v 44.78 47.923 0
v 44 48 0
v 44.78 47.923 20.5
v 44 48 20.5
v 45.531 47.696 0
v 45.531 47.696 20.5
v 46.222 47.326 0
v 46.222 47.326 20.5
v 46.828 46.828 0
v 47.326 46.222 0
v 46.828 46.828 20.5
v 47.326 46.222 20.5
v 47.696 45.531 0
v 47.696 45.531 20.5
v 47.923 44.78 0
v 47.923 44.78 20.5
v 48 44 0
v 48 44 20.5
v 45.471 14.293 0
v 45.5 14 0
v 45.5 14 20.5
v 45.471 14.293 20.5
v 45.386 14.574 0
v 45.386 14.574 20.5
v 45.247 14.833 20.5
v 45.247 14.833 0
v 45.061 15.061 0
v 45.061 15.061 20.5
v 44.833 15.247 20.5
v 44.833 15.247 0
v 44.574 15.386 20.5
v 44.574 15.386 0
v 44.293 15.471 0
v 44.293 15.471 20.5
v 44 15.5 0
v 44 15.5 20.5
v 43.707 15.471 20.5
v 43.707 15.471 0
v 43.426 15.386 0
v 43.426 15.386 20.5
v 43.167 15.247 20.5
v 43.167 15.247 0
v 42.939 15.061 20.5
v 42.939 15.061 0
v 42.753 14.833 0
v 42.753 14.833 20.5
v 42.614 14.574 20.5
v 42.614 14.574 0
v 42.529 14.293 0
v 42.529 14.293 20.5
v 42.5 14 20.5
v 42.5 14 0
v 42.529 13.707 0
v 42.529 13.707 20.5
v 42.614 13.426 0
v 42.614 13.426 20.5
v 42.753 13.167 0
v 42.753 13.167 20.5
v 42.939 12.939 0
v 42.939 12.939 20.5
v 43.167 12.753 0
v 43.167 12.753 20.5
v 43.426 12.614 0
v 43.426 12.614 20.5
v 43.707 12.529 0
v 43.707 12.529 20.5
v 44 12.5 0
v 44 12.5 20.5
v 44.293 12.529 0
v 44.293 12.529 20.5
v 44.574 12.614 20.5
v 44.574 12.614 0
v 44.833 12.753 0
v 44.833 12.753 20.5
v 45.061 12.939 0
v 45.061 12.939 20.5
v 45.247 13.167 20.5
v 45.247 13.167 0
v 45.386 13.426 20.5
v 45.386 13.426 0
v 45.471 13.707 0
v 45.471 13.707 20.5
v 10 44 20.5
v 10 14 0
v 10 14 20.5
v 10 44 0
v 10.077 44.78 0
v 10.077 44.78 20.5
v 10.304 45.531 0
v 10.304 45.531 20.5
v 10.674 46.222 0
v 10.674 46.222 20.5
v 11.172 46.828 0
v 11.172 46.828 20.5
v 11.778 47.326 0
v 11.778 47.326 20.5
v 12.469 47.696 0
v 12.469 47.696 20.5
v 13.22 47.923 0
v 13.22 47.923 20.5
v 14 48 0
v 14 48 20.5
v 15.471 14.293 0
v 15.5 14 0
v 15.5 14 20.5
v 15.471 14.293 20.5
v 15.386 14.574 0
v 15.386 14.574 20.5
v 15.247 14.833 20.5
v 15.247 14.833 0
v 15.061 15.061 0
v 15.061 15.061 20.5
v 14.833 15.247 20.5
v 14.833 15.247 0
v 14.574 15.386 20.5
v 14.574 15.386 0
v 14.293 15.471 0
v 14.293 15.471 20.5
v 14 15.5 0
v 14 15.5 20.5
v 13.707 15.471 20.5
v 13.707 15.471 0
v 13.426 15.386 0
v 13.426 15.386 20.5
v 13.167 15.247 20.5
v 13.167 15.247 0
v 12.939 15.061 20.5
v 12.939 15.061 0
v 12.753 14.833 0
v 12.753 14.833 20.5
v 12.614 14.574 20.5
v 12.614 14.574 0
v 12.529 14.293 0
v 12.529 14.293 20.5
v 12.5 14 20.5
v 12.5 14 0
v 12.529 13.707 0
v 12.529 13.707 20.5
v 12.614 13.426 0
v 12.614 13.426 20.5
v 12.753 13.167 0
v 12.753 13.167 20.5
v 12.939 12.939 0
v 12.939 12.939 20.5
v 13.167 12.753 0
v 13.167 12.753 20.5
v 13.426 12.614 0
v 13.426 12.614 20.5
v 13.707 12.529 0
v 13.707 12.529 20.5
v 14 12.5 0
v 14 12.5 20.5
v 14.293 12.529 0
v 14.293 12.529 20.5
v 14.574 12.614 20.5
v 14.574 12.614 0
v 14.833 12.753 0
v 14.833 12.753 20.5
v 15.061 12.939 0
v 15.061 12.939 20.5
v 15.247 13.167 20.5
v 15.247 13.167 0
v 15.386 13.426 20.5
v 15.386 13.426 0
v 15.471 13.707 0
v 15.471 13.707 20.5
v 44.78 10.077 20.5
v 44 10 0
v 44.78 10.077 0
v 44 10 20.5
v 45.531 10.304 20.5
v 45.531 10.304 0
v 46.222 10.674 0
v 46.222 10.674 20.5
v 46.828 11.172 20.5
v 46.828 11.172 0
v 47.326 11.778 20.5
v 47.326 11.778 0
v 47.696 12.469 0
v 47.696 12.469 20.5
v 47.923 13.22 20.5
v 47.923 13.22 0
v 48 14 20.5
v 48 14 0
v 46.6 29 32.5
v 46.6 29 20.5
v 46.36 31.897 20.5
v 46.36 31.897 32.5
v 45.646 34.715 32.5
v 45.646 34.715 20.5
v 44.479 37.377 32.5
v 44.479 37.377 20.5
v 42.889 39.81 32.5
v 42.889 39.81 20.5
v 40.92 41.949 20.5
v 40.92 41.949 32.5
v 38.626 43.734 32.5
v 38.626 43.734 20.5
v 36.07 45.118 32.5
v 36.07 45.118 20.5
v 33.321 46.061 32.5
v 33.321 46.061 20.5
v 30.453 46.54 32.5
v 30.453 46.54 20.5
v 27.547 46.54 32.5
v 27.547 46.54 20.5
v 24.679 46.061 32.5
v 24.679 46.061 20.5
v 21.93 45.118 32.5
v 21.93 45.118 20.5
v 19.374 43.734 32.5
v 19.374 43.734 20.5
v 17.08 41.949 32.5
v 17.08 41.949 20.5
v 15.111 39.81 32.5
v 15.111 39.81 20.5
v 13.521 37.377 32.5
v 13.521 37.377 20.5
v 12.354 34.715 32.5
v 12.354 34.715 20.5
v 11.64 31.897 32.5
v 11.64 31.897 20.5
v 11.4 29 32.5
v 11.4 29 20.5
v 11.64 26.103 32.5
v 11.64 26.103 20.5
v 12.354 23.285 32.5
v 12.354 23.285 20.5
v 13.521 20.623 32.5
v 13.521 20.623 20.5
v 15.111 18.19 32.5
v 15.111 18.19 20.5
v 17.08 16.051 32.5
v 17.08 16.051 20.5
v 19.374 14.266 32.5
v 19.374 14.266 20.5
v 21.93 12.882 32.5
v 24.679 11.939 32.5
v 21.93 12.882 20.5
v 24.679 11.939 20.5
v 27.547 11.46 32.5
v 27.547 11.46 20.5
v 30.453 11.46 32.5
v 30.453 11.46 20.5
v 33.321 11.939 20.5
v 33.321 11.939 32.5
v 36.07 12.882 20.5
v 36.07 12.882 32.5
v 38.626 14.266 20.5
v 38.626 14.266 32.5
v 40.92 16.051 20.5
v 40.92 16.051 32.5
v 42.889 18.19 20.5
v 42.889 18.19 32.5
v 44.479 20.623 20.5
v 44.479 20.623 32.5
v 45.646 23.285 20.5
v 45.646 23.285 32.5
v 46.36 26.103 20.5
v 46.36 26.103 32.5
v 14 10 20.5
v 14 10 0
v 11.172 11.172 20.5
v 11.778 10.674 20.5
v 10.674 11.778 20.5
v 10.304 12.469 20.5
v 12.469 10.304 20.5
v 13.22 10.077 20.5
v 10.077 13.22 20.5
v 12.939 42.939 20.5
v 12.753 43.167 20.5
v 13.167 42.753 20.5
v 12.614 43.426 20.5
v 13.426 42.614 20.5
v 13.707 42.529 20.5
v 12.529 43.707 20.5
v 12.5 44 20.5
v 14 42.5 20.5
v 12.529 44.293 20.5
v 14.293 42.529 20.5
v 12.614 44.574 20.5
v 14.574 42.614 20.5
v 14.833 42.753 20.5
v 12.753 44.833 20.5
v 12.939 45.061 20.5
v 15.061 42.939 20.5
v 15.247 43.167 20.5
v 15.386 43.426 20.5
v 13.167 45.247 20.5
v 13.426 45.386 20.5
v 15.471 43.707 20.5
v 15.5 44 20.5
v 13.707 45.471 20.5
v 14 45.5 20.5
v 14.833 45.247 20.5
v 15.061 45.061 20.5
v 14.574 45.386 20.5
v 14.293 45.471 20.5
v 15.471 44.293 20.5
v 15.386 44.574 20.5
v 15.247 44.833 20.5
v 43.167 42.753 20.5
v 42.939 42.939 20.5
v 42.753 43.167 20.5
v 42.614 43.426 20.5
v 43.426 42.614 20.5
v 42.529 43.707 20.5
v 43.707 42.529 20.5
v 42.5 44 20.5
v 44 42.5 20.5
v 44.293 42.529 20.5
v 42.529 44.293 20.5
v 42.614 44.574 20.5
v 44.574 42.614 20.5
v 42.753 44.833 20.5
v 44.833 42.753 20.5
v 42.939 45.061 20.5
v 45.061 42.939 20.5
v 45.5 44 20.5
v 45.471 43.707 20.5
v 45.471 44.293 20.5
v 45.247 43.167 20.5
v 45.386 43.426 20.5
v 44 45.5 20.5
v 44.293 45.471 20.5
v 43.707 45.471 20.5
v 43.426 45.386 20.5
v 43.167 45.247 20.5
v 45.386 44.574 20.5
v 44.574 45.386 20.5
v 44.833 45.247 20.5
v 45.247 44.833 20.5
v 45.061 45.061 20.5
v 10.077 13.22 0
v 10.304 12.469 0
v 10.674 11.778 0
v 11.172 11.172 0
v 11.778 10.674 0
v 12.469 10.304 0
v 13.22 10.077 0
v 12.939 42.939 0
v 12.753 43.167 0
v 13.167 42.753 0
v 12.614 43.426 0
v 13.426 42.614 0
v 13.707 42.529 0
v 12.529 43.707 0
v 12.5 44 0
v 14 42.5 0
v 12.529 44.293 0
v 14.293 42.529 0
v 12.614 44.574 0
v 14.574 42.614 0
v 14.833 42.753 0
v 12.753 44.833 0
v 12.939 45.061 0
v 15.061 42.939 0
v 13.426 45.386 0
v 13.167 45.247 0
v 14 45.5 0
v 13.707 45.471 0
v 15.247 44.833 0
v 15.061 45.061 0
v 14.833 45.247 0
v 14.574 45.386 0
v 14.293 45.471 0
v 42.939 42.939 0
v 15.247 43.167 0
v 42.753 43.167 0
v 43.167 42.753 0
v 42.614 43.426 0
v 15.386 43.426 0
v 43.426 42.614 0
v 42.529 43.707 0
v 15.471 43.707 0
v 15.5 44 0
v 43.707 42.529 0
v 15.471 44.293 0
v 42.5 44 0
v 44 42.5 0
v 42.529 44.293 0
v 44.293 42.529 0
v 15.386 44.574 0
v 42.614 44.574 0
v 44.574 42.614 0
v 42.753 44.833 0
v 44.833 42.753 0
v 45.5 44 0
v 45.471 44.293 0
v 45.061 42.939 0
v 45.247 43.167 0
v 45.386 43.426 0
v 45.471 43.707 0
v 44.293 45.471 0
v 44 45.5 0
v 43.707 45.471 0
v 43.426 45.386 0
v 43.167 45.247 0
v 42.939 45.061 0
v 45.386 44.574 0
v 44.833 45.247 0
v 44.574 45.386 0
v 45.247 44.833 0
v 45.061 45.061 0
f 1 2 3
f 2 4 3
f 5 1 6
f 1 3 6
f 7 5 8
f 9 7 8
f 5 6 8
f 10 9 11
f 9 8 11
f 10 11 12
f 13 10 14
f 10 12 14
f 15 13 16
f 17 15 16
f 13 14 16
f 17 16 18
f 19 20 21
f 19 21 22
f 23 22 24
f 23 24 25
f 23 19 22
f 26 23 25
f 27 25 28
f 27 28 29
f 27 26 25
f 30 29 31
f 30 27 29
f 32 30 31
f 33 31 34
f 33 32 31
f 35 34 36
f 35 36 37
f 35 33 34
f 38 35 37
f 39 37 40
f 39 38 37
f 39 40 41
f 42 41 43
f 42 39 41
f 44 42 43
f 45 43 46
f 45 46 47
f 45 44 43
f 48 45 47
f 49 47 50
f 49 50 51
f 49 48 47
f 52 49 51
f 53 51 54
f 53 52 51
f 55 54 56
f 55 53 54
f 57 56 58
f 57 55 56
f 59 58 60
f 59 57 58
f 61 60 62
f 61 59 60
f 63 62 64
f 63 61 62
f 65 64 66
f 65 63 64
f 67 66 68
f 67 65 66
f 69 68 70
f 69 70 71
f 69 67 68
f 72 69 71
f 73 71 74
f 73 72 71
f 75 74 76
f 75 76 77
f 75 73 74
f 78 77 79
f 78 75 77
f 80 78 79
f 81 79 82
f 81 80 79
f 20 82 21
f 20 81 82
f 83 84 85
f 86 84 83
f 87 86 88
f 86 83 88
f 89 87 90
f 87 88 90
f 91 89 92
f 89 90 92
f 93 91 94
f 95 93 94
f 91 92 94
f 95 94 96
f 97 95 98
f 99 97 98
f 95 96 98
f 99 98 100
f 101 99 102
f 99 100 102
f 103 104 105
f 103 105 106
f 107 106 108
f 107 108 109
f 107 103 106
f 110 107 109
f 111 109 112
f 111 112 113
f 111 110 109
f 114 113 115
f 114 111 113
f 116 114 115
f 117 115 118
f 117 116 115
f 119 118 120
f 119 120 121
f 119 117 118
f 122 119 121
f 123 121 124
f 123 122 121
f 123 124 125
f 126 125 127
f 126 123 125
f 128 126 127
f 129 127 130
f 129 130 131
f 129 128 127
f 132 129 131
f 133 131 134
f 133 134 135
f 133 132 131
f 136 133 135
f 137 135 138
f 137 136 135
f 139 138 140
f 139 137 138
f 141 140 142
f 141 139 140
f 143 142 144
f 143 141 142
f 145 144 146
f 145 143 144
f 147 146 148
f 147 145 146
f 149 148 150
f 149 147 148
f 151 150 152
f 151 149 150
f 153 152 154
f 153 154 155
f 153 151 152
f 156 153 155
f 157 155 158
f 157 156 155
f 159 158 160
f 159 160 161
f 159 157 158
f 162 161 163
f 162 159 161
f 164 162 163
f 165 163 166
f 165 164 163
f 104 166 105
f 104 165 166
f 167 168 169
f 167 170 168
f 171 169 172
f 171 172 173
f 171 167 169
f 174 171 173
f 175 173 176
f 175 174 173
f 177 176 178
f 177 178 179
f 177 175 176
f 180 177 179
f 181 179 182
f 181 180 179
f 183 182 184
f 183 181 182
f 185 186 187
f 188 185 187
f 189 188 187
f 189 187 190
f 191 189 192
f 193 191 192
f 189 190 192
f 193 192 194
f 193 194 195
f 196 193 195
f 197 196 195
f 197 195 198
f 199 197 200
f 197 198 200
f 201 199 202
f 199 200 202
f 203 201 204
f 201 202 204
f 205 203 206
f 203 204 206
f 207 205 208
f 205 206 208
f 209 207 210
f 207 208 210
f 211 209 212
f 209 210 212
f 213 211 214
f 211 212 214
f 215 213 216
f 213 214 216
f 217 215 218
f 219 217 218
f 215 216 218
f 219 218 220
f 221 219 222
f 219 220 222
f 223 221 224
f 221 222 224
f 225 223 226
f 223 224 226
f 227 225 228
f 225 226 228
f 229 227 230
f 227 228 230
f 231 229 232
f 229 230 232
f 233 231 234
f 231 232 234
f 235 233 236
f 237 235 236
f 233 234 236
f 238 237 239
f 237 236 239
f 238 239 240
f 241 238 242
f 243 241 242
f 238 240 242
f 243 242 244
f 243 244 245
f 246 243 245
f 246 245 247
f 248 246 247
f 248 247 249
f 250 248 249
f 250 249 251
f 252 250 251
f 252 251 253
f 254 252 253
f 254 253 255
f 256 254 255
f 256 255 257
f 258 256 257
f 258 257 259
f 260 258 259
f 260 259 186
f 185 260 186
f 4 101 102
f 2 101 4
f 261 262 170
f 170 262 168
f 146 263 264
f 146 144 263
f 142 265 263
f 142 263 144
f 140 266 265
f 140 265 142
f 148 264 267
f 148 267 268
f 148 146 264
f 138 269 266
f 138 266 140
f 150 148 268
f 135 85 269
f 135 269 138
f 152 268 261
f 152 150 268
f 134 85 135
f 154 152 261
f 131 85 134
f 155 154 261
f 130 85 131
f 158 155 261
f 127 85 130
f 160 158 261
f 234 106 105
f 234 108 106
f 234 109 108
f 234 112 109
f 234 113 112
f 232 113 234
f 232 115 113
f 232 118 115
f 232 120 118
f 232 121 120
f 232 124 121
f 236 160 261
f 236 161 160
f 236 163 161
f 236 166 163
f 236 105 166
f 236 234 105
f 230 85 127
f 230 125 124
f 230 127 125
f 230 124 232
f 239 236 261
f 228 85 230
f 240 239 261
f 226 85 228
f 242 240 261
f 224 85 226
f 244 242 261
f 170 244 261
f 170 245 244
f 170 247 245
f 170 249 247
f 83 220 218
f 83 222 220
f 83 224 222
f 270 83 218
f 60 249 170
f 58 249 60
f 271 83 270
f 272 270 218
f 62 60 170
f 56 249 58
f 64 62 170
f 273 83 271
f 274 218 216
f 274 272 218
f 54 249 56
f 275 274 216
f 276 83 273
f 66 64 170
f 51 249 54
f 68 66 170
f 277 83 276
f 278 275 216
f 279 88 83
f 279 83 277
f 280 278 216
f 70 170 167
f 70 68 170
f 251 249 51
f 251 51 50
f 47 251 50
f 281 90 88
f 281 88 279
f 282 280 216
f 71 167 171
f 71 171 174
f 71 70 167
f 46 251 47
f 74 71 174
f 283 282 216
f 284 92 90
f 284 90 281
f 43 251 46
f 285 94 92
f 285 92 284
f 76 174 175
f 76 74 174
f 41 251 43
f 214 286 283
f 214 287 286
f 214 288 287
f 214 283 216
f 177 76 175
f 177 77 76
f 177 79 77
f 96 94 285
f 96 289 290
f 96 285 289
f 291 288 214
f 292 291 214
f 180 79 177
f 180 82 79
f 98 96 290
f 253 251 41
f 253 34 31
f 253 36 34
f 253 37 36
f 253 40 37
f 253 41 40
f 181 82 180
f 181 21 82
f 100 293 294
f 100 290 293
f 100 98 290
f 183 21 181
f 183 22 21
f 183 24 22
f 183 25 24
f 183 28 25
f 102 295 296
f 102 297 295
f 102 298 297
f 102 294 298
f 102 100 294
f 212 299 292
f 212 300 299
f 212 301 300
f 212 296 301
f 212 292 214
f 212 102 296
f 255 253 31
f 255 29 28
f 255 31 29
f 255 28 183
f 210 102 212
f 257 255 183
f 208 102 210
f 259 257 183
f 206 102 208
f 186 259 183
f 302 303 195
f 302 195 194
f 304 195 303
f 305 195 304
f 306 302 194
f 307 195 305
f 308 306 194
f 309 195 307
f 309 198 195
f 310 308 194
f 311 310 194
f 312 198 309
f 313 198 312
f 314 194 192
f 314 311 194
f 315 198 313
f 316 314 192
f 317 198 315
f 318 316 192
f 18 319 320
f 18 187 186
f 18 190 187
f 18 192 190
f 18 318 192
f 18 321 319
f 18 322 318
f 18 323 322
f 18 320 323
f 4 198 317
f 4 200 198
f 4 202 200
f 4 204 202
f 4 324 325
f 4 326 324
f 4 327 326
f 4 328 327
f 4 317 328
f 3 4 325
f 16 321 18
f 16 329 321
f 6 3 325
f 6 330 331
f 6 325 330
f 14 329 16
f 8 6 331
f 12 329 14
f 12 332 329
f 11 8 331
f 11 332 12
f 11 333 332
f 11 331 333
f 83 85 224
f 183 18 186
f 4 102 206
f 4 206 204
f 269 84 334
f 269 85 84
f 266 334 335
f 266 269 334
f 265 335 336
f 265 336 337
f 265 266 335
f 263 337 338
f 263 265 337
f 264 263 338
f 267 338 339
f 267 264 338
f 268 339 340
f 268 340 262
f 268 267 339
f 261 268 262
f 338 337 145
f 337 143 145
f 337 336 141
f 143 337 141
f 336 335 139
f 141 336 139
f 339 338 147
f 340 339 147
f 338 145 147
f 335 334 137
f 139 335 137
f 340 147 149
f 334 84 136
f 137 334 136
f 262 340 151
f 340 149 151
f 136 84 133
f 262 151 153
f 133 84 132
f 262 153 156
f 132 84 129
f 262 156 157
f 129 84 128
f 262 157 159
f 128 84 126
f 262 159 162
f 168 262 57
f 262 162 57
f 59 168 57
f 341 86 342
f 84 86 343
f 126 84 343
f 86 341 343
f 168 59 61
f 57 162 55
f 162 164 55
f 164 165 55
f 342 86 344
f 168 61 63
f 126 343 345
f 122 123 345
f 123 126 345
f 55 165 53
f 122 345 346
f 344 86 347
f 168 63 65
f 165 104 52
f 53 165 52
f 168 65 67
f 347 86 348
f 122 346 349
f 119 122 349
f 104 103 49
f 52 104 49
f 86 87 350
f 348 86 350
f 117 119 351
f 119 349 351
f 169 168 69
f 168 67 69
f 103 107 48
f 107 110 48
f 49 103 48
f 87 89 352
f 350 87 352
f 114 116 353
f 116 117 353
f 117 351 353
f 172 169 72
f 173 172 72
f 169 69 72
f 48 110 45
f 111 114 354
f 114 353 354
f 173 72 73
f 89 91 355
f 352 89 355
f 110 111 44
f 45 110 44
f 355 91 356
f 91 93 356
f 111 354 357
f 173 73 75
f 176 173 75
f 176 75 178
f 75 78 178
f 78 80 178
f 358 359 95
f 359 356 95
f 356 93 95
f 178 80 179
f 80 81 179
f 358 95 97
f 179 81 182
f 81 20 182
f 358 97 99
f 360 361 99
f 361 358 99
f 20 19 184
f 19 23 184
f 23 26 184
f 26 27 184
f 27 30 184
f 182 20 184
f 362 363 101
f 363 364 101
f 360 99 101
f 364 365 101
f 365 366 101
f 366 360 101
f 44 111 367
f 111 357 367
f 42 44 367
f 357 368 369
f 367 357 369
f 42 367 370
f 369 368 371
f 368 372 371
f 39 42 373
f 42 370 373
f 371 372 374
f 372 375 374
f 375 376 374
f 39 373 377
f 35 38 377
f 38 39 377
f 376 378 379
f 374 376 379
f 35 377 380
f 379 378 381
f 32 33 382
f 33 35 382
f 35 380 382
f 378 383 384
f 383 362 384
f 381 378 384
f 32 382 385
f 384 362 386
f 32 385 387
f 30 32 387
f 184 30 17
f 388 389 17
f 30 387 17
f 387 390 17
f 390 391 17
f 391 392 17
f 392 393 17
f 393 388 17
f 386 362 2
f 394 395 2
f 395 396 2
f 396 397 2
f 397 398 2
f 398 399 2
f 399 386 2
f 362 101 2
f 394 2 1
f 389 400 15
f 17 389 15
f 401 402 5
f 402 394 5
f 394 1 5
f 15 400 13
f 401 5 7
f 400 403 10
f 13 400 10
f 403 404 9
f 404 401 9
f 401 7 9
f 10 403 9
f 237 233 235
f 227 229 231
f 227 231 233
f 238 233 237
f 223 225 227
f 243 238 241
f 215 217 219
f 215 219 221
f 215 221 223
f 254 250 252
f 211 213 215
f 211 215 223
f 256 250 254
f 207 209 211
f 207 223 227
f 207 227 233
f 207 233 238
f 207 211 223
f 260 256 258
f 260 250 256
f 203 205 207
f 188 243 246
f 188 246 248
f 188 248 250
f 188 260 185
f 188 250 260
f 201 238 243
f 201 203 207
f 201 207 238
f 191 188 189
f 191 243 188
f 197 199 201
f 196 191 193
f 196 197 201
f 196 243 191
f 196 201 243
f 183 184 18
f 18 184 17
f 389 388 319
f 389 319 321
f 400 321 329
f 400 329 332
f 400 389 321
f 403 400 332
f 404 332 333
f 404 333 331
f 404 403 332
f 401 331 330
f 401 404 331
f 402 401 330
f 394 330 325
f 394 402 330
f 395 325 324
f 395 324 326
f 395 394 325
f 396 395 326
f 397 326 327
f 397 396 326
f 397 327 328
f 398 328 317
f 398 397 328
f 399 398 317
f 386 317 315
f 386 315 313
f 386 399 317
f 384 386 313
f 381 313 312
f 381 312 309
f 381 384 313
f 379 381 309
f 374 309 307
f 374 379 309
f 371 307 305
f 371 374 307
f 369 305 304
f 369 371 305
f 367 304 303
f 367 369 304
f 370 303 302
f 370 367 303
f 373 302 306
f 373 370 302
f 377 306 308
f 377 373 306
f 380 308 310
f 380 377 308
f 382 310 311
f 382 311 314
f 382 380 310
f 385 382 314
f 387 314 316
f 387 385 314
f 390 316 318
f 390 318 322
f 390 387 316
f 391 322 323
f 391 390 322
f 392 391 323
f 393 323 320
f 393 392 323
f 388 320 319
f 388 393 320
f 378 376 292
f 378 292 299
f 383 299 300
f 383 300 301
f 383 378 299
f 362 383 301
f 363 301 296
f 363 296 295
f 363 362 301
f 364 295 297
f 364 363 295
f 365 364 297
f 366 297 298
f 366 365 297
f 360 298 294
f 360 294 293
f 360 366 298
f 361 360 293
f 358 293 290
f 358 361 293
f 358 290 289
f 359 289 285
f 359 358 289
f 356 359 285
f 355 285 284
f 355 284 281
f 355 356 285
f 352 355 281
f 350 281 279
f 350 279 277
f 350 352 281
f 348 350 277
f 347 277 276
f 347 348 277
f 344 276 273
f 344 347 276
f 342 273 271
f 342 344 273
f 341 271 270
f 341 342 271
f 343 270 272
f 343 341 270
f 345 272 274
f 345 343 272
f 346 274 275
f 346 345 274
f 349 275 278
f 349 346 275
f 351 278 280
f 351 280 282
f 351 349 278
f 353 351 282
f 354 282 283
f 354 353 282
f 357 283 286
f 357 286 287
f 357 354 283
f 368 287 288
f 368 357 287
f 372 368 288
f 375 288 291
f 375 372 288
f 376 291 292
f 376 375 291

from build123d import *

# Parameters (mm, degrees)
SKETCH_W     = 38
SKETCH_H     = 38
SKETCH_R     = 1.5
PAD_DEPTH    = 20.5
SKETCH001_R  = 17.6
PAD001_DEPTH = 12
FILLET_R     = 4


with BuildPart() as part:
    # Sketch → Pad (new body)
    with BuildSketch(Plane.XY):
        with Locations((29, 29)):
            Rectangle(SKETCH_W, SKETCH_H)
        with Locations((14, 14)):
            Circle(SKETCH_R, mode=Mode.SUBTRACT)
        with Locations((14, 44)):
            Circle(SKETCH_R, mode=Mode.SUBTRACT)
        with Locations((44, 44)):
            Circle(SKETCH_R, mode=Mode.SUBTRACT)
        with Locations((44, 14)):
            Circle(SKETCH_R, mode=Mode.SUBTRACT)
    extrude(amount=PAD_DEPTH)

    # Sketch001 (on Face10 of Pad) → Pad001 (join)
    with BuildSketch(Plane.XY.offset(20.5)):
        with Locations((29, 29)):
            Circle(SKETCH001_R)
    extrude(amount=PAD001_DEPTH)

    # Fillet
    fillet_edges = [part.edges().sort_by_distance(p)[0] for p in [
        (48, 10, 10.25),
        (48, 48, 10.25),
        (10, 48, 10.25),
        (10, 10, 10.25),
    ]]
    fillet(fillet_edges, radius=FILLET_R)


solid = part.part
